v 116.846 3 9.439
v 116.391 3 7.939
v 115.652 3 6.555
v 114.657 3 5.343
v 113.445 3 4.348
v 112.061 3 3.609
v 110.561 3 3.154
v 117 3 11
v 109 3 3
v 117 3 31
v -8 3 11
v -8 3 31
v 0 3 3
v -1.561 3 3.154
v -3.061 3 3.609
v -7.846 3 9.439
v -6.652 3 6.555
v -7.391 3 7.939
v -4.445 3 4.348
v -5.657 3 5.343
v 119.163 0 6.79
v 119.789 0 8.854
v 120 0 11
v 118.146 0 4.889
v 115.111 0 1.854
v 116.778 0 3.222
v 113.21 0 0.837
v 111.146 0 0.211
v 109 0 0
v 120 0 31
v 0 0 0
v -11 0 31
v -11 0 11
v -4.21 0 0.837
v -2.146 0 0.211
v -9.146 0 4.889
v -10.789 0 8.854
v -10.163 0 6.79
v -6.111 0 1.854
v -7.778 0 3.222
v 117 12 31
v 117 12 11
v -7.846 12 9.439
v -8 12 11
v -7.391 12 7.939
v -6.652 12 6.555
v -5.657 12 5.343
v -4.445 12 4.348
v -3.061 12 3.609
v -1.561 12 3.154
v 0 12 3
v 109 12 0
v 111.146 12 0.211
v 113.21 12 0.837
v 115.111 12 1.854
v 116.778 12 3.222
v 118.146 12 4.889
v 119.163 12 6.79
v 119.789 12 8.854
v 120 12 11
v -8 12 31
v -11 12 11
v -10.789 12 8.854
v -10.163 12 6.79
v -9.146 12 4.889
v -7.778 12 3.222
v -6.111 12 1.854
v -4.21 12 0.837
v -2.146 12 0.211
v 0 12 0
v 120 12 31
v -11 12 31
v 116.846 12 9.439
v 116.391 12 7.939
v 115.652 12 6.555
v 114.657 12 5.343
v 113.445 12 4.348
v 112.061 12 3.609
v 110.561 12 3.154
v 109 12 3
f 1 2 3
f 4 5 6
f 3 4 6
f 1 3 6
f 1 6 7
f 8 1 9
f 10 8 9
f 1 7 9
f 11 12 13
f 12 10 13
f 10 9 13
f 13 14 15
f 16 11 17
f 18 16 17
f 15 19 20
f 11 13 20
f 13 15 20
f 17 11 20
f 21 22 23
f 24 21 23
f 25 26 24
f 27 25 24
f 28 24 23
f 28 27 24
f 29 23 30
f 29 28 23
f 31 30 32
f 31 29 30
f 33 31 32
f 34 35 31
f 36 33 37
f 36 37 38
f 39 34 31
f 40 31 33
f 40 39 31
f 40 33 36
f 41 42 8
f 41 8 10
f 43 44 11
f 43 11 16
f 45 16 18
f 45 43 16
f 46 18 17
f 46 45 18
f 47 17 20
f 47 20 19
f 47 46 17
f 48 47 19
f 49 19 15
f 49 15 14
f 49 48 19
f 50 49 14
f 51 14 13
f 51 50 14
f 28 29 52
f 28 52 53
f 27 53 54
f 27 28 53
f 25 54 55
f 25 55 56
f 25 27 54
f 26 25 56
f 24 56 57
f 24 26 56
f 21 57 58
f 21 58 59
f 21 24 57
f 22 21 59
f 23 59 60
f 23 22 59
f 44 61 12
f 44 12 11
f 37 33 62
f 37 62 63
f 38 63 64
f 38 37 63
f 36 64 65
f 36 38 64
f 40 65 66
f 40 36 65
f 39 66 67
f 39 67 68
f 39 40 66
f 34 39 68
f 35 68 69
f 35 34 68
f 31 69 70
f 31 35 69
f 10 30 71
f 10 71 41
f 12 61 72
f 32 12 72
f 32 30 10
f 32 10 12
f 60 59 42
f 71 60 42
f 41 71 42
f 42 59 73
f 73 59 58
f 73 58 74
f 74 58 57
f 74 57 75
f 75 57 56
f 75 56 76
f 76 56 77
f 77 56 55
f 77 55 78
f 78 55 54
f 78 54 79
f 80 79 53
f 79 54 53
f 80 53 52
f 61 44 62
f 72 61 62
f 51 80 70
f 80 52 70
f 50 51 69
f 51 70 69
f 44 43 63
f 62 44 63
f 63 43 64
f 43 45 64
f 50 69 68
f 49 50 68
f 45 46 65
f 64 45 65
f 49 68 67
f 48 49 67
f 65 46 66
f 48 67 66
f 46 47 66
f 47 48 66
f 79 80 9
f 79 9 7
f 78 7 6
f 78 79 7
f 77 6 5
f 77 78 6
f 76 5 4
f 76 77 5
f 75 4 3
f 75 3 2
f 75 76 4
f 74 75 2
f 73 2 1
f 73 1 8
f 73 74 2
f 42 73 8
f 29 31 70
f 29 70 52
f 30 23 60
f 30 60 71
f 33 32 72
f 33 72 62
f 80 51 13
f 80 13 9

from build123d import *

# Parameters (mm, degrees)
EXTRUDE_1_DEPTH     = 12
CUT_EXTRUDE_1_DEPTH = 9


with BuildPart() as part:
    # 草图1 → 凸台-拉伸1 (new body)
    with BuildSketch(Plane(origin=(0, 0, 0), x_dir=(1, 0, 0), z_dir=(0, 1, 0))):
        with BuildLine():
            Line((0, 0), (109, 0))
            ThreePointArc((109, 0), (116.778174593, -3.221825407), (120, -11))
            Line((120, -11), (120, -31))
            Line((120, -31), (-11, -31))
            Line((-11, -31), (-11, -11))
            ThreePointArc((-11, -11), (-7.778174593, -3.221825407), (0, 0))
        make_face()
    extrude(amount=EXTRUDE_1_DEPTH)

    # 草图2 → 切除-拉伸1 (cut)
    with BuildSketch(Plane(origin=(0, 12, 0), x_dir=(1, 0, 0), z_dir=(0, 1, 0))):
        with BuildLine():
            Line((-8, -31), (-8, -11))
            ThreePointArc((-8, -11), (-5.656854249, -5.343145751), (0, -3))
            Line((0, -3), (109, -3))
            ThreePointArc((109, -3), (114.656854249, -5.343145751), (117, -11))
            Line((117, -11), (117, -31))
            Line((117, -31), (-8, -31))
        make_face()
    extrude(amount=-CUT_EXTRUDE_1_DEPTH, mode=Mode.SUBTRACT)


solid = part.part
